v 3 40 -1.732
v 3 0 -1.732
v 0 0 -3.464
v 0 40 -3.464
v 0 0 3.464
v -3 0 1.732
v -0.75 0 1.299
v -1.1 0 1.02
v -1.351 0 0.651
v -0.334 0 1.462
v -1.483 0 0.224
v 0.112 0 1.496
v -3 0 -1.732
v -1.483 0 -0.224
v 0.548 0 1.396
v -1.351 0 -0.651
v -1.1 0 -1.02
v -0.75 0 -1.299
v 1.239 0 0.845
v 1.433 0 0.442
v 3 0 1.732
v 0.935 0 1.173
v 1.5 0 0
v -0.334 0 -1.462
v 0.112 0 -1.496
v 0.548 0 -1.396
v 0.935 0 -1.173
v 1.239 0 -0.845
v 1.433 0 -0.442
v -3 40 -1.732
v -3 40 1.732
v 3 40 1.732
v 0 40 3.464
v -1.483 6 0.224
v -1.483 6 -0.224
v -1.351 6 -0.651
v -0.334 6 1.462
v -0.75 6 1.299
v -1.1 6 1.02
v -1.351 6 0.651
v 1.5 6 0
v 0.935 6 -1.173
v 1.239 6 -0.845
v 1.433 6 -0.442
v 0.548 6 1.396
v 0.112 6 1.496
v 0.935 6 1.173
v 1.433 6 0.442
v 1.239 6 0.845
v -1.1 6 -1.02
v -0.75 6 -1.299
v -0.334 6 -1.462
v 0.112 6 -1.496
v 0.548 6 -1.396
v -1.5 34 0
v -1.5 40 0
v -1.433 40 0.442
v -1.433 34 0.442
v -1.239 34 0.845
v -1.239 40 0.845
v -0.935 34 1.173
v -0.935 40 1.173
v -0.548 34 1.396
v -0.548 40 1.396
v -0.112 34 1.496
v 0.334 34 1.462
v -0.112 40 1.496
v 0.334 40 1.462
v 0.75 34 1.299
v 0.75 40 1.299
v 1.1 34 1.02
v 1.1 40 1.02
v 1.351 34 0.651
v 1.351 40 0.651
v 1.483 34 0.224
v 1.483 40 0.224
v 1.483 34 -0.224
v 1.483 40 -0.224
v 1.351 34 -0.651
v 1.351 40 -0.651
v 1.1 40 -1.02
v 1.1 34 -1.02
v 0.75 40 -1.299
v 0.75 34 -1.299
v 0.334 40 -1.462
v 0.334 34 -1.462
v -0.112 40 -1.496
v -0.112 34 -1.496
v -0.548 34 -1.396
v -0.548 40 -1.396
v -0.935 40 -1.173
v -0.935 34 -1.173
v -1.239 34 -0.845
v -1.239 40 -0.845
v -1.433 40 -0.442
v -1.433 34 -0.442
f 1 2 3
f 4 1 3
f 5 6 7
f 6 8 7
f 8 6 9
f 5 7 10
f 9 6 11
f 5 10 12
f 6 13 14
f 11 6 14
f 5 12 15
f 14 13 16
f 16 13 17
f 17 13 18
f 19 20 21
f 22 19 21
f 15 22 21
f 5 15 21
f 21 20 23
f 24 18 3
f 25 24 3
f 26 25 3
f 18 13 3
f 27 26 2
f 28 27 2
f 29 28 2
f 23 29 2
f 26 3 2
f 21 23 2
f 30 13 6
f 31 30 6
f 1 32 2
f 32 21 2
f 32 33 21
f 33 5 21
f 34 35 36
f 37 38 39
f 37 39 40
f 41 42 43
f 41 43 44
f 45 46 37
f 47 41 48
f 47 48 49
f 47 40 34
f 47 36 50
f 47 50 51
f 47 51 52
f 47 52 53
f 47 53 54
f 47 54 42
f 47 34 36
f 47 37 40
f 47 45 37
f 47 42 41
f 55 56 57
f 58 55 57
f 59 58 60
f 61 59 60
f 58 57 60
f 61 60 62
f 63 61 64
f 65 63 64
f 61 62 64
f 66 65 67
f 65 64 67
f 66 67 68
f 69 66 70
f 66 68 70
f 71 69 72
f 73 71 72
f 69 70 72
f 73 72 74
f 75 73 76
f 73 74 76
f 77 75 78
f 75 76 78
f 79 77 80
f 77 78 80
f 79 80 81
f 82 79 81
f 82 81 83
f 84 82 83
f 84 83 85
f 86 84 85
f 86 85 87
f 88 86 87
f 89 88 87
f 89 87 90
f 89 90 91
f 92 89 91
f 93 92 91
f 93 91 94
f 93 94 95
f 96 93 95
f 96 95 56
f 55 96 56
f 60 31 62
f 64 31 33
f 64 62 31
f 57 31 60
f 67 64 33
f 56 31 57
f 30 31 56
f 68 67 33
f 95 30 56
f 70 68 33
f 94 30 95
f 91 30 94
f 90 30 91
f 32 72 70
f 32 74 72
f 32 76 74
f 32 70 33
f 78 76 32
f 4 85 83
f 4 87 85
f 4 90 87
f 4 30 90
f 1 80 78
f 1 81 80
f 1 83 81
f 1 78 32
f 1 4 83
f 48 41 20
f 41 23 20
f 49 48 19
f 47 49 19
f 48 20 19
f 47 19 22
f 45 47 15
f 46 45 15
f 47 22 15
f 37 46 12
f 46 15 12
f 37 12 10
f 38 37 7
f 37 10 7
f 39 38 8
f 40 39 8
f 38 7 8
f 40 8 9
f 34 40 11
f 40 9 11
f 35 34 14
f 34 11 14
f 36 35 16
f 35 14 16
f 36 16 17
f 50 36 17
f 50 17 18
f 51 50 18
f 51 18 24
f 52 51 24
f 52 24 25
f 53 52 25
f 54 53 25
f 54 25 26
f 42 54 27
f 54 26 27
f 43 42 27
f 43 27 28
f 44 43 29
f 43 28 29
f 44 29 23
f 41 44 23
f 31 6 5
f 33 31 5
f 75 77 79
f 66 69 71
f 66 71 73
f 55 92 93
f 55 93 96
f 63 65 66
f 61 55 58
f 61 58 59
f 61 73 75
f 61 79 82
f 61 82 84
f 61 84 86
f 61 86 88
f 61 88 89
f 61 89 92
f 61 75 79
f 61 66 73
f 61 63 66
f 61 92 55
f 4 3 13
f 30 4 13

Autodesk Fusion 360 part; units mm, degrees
sketch "Sketch1" plane through (0, 0, 0) normal (0, 1, 0) x (1, 0, 0)
  line L0 (3, 1.7321) -> (0, 3.4641)
  line L1 (0, 3.4641) -> (-3, 1.7321)
  line L2 (-3, 1.7321) -> (-3, -1.7321)
  line L3 (-3, -1.7321) -> (0, -3.4641)
  line L4 (0, -3.4641) -> (3, -1.7321)
  line L5 (3, -1.7321) -> (3, 1.7321)
  dimension "d1" = 3
extrude "Extrude1" add sketch "Sketch1" along normal blind 40
sketch "Sketch4" plane through (0, 40, 0) normal (0, 1, 0) x (-1, 0, 0)
  line L0 (0, 3.4641) -> (-3, 1.7321)
  line L1 (-3, 1.7321) -> (-3, -1.7321)
  line L2 (-3, -1.7321) -> (0, -3.4641)
  line L3 (0, -3.4641) -> (3, -1.7321)
  line L4 (3, -1.7321) -> (3, 1.7321)
  line L5 (3, 1.7321) -> (0, 3.4641)
  circle A0 centre (0, 0) radius 1.5
  line L6 (-3, 1.7321) -> (-3, -1.7321)
  line L7 (-3, -1.7321) -> (0, -3.4641)
  line L8 (0, -3.4641) -> (3, -1.7321)
  line L9 (3, -1.7321) -> (3, 1.7321)
  line L10 (3, 1.7321) -> (0, 3.4641)
  line L11 (0, 3.4641) -> (-3, 1.7321)
  dimension "d8" = 3
extrude "Extrude4" cut sketch "Sketch4" against normal blind 6 contours A0
thread "Thread1"
sketch "Sketch5" plane through (0, 0, 0) normal (0, -1, 0) x (1, 0, 0)
  line L0 (3, -1.7321) -> (3, 1.7321)
  line L1 (3, 1.7321) -> (0, 3.4641)
  line L2 (0, 3.4641) -> (-3, 1.7321)
  line L3 (-3, 1.7321) -> (-3, -1.7321)
  line L4 (-3, -1.7321) -> (0, -3.4641)
  line L5 (0, -3.4641) -> (3, -1.7321)
  circle A0 centre (0, 0) radius 1.5
  dimension "d11" = 3
extrude "Extrude5" cut sketch "Sketch5" against normal blind 6 contours A0
thread "Thread2"
